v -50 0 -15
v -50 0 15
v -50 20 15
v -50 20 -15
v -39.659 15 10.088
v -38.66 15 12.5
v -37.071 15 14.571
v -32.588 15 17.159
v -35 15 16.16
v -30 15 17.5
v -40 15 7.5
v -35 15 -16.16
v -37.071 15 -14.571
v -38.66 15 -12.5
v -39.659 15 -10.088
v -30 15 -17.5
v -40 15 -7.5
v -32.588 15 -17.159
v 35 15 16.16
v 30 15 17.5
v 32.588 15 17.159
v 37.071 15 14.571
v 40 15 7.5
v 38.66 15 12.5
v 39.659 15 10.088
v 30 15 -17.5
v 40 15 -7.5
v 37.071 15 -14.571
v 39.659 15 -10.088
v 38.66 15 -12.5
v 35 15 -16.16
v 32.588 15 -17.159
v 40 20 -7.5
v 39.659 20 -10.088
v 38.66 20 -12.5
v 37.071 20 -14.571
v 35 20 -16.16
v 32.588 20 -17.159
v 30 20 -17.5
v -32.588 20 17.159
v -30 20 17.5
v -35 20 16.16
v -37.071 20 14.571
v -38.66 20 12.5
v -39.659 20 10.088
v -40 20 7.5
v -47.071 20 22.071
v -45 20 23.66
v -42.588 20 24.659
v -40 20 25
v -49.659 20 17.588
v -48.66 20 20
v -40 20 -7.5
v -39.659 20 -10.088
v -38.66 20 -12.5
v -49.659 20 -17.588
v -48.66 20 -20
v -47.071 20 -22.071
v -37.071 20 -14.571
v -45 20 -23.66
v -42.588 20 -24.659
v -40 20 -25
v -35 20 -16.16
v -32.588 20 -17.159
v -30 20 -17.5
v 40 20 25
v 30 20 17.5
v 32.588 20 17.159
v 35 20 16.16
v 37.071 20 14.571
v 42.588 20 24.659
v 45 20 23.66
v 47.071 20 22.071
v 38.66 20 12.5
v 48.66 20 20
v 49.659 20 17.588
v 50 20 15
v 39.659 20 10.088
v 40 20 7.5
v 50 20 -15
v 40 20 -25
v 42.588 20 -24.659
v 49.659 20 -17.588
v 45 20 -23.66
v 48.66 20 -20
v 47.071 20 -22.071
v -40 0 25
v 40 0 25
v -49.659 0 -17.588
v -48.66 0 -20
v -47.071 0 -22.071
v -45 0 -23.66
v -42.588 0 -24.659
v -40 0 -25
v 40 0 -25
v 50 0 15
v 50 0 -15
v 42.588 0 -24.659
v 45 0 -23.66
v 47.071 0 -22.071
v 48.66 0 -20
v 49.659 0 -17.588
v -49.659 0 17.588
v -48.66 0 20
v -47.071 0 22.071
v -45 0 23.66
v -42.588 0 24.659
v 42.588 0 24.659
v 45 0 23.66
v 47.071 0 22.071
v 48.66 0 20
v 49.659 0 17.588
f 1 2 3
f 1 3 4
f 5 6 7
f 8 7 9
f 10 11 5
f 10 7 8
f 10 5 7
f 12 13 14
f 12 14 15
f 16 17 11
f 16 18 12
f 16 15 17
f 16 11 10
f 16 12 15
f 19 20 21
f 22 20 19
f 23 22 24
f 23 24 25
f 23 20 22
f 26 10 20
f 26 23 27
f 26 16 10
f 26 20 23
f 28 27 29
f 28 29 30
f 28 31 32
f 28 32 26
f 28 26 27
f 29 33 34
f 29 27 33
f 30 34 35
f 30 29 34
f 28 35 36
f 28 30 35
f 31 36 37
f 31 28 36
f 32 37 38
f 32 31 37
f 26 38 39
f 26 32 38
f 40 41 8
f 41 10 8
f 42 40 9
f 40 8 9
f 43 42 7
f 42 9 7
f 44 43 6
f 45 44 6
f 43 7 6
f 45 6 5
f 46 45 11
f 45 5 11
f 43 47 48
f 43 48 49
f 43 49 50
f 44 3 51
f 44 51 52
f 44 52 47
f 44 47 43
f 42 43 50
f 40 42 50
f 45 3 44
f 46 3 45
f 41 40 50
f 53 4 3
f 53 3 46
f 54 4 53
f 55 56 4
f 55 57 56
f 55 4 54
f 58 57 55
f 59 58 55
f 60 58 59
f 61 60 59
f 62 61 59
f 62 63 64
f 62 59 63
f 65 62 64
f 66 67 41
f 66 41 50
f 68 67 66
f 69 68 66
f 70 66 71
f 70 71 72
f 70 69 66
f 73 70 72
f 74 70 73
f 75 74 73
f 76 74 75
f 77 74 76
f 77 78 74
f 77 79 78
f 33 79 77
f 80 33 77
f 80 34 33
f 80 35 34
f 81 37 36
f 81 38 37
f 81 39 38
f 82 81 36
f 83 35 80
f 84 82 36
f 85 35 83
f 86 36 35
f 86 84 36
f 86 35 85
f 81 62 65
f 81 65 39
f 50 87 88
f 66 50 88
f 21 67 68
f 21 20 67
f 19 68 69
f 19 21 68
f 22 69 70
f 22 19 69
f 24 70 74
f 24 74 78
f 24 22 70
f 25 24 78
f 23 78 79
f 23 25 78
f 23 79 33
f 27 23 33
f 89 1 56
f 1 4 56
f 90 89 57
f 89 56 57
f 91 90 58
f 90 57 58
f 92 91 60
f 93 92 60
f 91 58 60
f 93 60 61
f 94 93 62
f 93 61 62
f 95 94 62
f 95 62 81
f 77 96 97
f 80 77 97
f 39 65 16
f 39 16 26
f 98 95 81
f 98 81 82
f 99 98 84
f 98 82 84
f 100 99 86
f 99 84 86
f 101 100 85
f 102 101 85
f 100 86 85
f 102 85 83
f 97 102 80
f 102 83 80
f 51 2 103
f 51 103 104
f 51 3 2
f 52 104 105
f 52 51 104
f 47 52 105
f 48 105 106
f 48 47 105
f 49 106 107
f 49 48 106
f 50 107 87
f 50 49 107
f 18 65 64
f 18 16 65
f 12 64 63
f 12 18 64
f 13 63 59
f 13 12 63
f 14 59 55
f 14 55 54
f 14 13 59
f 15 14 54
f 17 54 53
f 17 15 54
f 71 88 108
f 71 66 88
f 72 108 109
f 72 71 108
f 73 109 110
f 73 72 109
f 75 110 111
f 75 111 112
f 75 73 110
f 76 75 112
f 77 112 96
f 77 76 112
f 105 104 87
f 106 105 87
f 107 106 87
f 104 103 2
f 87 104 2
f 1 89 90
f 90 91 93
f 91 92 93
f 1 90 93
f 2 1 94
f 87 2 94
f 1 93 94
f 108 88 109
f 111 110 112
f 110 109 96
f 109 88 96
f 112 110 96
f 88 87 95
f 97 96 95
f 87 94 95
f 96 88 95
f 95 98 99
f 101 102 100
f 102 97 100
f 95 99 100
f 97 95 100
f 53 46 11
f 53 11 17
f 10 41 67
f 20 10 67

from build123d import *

# Parameters (mm, degrees)
SKETCH1_W           = 100
SKETCH1_H           = 50
BOSS_EXTRUDE1_DEPTH = 20
SKETCH2_W           = 80
SKETCH2_H           = 35
CUT_EXTRUDE1_DEPTH  = 5
FILLET1_R           = 10
FILLET2_R           = 10


with BuildPart() as part:
    # Sketch1 → Boss-Extrude1 (new body)
    with BuildSketch(Plane(origin=(0, 0, 0), x_dir=(1, 0, 0), z_dir=(0, 1, 0))):
        Rectangle(SKETCH1_W, SKETCH1_H)
    extrude(amount=BOSS_EXTRUDE1_DEPTH)

    # Sketch2 → Cut-Extrude1 (cut)
    with BuildSketch(Plane(origin=(0, 20, 0), x_dir=(1, 0, 0), z_dir=(0, 1, 0))):
        Rectangle(SKETCH2_W, SKETCH2_H)
    extrude(amount=-CUT_EXTRUDE1_DEPTH, mode=Mode.SUBTRACT)

    # Fillet1
    fillet1_edges = [part.edges().sort_by_distance(p)[0] for p in [
        (-50, 10, -25),
        (50, 10, -25),
        (50, 10, 25),
        (-50, 10, 25),
    ]]
    fillet(fillet1_edges, radius=FILLET1_R)

    # Fillet2
    fillet2_edges = [part.edges().sort_by_distance(p)[0] for p in [
        (-40, 17.5, 17.5),
        (-40, 17.5, -17.5),
        (40, 17.5, -17.5),
        (40, 17.5, 17.5),
    ]]
    fillet(fillet2_edges, radius=FILLET2_R)


solid = part.part
